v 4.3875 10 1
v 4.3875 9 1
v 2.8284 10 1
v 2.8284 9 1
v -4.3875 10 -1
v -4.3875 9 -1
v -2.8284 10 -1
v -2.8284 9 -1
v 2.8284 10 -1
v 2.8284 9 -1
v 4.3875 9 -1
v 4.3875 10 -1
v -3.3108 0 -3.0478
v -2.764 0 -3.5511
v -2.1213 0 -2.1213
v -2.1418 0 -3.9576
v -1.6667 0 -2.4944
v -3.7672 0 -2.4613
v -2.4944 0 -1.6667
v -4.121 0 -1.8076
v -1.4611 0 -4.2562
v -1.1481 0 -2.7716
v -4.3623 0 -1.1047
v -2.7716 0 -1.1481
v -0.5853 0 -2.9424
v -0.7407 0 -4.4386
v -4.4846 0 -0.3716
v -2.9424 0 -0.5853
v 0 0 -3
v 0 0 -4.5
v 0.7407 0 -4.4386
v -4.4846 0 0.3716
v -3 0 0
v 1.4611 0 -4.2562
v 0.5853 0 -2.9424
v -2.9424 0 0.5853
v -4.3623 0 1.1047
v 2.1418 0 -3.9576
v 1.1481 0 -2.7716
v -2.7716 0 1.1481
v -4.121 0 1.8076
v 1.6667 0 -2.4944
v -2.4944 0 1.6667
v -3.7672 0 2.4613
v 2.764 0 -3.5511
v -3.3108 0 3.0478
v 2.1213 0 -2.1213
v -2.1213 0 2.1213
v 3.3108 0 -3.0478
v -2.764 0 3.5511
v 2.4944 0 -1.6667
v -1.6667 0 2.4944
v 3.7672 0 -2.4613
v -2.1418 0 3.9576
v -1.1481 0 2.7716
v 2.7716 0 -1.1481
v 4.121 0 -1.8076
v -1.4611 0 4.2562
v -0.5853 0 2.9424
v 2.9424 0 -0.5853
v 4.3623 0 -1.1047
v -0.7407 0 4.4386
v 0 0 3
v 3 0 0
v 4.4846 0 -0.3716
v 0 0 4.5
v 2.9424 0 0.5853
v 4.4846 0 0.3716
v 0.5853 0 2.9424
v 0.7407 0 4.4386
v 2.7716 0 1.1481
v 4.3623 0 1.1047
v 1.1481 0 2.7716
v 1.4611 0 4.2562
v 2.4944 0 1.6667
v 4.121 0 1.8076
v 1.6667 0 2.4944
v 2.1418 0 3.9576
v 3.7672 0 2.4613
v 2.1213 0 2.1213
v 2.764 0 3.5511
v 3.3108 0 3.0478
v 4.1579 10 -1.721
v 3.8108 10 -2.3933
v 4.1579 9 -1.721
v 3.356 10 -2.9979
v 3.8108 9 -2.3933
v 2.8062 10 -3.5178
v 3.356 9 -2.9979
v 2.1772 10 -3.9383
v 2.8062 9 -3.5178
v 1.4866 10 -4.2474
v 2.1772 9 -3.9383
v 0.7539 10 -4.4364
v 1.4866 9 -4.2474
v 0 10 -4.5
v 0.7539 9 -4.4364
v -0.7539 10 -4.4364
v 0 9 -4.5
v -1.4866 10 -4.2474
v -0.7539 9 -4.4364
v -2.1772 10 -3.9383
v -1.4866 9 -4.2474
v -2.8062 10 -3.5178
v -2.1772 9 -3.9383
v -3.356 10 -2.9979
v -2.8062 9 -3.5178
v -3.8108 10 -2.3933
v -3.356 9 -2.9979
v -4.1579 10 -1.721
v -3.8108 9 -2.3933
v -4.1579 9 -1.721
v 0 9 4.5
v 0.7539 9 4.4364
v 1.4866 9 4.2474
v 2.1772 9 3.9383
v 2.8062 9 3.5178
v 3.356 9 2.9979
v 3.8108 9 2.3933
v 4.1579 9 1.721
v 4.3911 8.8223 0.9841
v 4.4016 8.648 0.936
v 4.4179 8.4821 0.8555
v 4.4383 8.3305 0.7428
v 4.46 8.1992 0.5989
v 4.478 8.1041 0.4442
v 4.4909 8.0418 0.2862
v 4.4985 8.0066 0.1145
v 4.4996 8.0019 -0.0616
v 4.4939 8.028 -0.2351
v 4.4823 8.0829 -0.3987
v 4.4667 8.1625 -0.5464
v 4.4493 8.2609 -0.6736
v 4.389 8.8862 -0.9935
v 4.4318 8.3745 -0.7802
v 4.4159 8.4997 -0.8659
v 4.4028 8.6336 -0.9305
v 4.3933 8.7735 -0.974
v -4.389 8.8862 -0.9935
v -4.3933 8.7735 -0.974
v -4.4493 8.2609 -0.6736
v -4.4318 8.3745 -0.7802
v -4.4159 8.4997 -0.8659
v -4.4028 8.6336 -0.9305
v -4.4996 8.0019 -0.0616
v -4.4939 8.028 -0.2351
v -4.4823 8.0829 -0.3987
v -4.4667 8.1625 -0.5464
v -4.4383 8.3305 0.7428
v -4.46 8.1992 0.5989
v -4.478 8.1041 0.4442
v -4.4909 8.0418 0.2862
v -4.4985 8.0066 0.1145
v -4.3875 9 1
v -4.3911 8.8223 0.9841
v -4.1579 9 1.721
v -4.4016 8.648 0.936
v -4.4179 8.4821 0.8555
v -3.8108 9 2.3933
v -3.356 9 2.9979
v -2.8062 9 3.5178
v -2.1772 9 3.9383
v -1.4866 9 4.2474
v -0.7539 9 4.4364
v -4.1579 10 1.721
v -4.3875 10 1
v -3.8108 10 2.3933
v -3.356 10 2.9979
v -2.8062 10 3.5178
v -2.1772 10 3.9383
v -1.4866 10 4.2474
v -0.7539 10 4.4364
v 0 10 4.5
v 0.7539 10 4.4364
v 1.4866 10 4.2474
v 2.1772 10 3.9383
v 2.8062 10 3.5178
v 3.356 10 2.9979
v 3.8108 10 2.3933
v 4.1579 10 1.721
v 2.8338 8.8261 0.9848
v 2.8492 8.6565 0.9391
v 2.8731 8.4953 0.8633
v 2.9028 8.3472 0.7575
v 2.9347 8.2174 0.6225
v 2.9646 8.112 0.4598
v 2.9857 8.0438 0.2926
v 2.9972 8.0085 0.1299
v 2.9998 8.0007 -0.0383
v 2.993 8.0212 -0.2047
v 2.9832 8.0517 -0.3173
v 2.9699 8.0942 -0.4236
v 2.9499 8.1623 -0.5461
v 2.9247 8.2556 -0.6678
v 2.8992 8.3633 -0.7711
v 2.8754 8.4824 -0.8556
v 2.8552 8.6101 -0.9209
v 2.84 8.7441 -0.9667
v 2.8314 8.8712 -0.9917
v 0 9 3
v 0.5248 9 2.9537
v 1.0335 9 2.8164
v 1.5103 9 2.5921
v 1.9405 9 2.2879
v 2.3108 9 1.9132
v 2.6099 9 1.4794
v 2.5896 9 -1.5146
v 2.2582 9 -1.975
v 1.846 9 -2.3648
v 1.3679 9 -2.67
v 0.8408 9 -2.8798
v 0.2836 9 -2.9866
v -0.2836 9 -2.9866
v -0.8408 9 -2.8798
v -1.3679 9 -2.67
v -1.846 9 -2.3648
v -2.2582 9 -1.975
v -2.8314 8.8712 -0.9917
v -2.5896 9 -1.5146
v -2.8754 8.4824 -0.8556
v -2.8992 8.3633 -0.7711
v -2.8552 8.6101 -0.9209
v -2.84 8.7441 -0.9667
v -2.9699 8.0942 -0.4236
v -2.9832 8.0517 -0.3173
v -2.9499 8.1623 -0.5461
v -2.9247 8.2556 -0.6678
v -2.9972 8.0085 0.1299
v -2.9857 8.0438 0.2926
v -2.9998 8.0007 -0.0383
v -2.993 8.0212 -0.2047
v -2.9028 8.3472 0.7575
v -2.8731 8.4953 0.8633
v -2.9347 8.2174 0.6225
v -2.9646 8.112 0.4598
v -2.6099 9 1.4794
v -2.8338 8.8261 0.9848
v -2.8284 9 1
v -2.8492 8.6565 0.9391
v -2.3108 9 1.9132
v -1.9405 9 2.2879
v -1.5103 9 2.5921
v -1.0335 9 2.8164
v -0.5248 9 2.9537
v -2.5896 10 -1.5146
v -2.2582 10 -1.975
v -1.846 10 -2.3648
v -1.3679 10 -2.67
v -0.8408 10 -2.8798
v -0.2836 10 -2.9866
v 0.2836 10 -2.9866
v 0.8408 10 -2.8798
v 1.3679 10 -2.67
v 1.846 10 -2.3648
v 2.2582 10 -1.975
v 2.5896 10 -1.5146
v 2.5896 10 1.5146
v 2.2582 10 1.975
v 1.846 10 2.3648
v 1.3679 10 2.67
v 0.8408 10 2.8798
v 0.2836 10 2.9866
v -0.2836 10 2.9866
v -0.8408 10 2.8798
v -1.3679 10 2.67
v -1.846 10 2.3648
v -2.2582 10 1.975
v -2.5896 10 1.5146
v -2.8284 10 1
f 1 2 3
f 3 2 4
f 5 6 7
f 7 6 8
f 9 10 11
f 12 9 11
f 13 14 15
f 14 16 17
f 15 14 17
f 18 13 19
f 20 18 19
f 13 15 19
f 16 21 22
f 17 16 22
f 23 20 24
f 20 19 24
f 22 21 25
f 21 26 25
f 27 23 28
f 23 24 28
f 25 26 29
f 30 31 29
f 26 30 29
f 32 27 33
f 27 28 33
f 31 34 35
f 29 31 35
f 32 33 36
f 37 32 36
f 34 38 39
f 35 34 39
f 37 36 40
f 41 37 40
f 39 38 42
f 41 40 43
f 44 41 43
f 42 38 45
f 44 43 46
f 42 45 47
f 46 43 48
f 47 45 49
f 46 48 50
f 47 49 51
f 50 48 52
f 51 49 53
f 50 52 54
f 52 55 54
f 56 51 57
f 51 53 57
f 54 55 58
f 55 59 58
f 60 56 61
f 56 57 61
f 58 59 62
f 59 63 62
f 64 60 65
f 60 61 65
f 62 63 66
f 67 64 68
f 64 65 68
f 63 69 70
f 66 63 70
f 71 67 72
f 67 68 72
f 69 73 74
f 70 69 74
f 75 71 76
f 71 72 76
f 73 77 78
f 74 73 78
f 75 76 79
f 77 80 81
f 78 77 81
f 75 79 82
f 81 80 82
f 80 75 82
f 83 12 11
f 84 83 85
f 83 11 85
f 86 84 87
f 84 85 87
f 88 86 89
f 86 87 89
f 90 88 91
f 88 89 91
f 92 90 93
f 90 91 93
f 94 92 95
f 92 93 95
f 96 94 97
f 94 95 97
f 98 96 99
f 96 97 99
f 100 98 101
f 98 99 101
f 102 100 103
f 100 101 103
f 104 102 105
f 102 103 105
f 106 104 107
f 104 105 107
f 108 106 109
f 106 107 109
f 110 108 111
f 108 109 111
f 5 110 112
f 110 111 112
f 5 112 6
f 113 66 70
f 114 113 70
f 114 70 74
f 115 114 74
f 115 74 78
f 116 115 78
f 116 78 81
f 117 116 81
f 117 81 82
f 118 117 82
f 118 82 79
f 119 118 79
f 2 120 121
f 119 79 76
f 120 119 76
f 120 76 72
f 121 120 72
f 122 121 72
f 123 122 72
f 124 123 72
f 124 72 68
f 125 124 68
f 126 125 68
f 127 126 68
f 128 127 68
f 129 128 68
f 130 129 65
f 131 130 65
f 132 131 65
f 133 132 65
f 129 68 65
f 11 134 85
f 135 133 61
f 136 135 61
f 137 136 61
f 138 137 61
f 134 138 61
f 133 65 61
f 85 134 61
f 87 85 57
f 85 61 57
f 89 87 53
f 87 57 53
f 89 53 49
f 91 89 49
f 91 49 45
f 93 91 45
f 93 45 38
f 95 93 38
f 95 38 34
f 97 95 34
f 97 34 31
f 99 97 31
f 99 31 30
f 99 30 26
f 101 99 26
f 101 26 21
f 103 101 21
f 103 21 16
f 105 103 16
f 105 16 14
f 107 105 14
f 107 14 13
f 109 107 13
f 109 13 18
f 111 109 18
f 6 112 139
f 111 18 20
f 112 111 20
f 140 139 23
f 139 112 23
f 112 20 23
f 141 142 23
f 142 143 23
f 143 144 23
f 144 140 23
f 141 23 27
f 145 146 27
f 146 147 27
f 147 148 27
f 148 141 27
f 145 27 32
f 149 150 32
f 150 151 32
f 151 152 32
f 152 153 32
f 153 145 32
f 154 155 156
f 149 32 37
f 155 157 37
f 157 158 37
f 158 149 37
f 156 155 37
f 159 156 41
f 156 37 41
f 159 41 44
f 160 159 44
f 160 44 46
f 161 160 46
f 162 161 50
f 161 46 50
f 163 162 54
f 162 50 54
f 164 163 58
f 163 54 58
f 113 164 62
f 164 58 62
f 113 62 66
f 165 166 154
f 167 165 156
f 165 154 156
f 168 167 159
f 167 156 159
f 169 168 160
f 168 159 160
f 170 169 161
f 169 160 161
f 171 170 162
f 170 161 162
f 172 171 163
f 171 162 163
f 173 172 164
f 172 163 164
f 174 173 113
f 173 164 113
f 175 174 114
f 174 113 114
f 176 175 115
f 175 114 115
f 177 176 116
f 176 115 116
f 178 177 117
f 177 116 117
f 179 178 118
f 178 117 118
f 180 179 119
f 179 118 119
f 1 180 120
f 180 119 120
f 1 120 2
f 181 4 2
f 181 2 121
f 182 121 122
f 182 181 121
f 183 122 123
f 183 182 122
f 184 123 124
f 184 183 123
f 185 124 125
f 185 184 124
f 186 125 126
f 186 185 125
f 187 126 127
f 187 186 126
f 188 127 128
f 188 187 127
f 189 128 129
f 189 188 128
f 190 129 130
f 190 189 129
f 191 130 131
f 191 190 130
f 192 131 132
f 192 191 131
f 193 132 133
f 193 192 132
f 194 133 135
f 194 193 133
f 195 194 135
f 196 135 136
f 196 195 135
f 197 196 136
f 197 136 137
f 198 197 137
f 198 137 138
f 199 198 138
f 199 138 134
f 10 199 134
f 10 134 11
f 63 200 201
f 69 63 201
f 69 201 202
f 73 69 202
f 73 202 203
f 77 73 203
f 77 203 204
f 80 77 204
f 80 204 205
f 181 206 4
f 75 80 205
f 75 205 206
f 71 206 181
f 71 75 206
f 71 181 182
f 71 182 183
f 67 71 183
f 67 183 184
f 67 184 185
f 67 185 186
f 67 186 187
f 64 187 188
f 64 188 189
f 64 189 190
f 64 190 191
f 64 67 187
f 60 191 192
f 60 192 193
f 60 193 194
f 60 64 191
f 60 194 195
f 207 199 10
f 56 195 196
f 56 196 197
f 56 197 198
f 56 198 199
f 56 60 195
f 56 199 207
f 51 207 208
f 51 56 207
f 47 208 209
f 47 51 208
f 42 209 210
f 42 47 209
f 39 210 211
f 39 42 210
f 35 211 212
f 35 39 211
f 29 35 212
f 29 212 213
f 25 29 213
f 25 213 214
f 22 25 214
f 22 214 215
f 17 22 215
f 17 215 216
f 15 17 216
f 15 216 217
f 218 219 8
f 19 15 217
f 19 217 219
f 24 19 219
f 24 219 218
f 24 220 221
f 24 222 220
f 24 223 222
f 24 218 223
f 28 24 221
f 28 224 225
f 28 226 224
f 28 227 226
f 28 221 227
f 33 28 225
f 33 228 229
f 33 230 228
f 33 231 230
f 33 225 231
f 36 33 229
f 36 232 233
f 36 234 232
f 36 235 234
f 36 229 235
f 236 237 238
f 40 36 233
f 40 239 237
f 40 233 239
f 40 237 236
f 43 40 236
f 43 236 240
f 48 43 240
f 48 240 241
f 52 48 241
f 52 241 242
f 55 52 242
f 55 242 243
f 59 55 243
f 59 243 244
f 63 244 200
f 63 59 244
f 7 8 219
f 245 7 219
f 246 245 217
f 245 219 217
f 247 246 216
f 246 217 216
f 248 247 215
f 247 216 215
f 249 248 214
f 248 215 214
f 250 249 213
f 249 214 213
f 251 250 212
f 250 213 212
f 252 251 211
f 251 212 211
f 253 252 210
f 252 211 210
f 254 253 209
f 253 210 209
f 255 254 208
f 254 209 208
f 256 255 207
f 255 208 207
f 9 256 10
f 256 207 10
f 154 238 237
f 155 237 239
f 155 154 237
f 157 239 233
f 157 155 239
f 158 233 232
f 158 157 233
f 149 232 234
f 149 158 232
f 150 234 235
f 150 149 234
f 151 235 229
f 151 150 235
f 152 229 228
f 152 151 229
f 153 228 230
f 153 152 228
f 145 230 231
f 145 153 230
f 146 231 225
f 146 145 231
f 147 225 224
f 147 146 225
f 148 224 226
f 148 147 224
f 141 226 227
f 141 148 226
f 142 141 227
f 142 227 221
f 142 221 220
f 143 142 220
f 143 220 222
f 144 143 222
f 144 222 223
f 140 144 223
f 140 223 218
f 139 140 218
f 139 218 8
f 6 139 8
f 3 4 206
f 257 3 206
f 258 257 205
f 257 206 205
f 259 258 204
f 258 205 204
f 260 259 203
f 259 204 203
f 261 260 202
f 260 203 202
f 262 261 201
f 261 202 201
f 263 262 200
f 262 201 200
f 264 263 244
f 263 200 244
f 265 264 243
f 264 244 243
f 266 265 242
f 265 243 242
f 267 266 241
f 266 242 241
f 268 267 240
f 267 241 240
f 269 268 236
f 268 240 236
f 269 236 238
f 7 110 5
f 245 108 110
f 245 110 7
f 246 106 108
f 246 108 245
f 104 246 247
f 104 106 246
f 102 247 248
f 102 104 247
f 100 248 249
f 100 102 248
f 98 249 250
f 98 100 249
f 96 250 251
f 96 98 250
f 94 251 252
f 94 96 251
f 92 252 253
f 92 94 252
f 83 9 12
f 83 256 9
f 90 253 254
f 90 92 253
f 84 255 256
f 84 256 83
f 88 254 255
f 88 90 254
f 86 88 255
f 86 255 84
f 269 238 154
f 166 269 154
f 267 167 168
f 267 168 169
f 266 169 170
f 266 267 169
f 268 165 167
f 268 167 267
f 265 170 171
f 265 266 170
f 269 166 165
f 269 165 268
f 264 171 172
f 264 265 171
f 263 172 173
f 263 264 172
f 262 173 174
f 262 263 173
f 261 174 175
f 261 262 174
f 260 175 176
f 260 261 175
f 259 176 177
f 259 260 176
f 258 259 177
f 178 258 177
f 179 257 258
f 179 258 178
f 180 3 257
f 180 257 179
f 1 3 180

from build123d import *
from build123d.topology import SkipClean

# Parameters (mm, degrees)
SKETCH_1_R               = 4.5
SKETCH_1_R_2             = 3
EXTRUDE_1_DEPTH          = 9
CUT_EXTRUDE_3_DEPTH      = 12.022703843
CUT_EXTRUDE_3_DEPTH_BACK = 12.022703843
SKETCH_2_R               = 1
EXTRUDE_2_DEPTH          = 1


with BuildPart() as part:
    # ｽｹｯﾁ1 → ﾎﾞｽ - 押し出し1 (new body)
    with BuildSketch(Plane(origin=(0, 0, 0), x_dir=(1, 0, 0), z_dir=(0, 1, 0))):
        with Locations(Location((0, 0, 0), (0, 0, 270))):
            Circle(SKETCH_1_R)
        with Locations(Location((0, 0, 0), (0, 0, 270))):
            Circle(SKETCH_1_R_2, mode=Mode.SUBTRACT)
    extrude(amount=EXTRUDE_1_DEPTH)

    # ｽｹｯﾁ2 → ｶｯﾄ - 押し出し3 (cut, two sides: drawn at the far end of the back side and taken through both)
    with BuildSketch(Plane(origin=(0, 0, 0), x_dir=(0, 0, -1), z_dir=(1, 0, 0)).offset(-CUT_EXTRUDE_3_DEPTH_BACK)):
        with Locations((0, 9)):
            Circle(SKETCH_2_R)
    extrude(amount=CUT_EXTRUDE_3_DEPTH + CUT_EXTRUDE_3_DEPTH_BACK, mode=Mode.SUBTRACT)

    # ｽｹｯﾁ3 → ﾎﾞｽ - 押し出し2 (add)
    with SkipClean():  # the faces are left unmerged after this step: merging them gives an invalid solid
        with BuildSketch(Plane(origin=(0, 9, 0), x_dir=(1, 0, 0), z_dir=(0, 1, 0))):
            with BuildLine():
                Line((-2.828427125, -1), (-4.387482194, -1))
                ThreePointArc((-4.387482194, -1), (0, -4.5), (4.387482194, -1))
                Line((4.387482194, -1), (2.828427125, -1))
                ThreePointArc((2.828427125, -1), (0, -3), (-2.828427125, -1))
            make_face()
            with BuildLine():
                Line((2.828427125, 1), (4.387482194, 1))
                ThreePointArc((4.387482194, 1), (0, 4.5), (-4.387482194, 1))
                Line((-4.387482194, 1), (-2.828427125, 1))
                ThreePointArc((-2.828427125, 1), (0, 3), (2.828427125, 1))
            make_face()
        extrude(amount=EXTRUDE_2_DEPTH)


solid = part.part
